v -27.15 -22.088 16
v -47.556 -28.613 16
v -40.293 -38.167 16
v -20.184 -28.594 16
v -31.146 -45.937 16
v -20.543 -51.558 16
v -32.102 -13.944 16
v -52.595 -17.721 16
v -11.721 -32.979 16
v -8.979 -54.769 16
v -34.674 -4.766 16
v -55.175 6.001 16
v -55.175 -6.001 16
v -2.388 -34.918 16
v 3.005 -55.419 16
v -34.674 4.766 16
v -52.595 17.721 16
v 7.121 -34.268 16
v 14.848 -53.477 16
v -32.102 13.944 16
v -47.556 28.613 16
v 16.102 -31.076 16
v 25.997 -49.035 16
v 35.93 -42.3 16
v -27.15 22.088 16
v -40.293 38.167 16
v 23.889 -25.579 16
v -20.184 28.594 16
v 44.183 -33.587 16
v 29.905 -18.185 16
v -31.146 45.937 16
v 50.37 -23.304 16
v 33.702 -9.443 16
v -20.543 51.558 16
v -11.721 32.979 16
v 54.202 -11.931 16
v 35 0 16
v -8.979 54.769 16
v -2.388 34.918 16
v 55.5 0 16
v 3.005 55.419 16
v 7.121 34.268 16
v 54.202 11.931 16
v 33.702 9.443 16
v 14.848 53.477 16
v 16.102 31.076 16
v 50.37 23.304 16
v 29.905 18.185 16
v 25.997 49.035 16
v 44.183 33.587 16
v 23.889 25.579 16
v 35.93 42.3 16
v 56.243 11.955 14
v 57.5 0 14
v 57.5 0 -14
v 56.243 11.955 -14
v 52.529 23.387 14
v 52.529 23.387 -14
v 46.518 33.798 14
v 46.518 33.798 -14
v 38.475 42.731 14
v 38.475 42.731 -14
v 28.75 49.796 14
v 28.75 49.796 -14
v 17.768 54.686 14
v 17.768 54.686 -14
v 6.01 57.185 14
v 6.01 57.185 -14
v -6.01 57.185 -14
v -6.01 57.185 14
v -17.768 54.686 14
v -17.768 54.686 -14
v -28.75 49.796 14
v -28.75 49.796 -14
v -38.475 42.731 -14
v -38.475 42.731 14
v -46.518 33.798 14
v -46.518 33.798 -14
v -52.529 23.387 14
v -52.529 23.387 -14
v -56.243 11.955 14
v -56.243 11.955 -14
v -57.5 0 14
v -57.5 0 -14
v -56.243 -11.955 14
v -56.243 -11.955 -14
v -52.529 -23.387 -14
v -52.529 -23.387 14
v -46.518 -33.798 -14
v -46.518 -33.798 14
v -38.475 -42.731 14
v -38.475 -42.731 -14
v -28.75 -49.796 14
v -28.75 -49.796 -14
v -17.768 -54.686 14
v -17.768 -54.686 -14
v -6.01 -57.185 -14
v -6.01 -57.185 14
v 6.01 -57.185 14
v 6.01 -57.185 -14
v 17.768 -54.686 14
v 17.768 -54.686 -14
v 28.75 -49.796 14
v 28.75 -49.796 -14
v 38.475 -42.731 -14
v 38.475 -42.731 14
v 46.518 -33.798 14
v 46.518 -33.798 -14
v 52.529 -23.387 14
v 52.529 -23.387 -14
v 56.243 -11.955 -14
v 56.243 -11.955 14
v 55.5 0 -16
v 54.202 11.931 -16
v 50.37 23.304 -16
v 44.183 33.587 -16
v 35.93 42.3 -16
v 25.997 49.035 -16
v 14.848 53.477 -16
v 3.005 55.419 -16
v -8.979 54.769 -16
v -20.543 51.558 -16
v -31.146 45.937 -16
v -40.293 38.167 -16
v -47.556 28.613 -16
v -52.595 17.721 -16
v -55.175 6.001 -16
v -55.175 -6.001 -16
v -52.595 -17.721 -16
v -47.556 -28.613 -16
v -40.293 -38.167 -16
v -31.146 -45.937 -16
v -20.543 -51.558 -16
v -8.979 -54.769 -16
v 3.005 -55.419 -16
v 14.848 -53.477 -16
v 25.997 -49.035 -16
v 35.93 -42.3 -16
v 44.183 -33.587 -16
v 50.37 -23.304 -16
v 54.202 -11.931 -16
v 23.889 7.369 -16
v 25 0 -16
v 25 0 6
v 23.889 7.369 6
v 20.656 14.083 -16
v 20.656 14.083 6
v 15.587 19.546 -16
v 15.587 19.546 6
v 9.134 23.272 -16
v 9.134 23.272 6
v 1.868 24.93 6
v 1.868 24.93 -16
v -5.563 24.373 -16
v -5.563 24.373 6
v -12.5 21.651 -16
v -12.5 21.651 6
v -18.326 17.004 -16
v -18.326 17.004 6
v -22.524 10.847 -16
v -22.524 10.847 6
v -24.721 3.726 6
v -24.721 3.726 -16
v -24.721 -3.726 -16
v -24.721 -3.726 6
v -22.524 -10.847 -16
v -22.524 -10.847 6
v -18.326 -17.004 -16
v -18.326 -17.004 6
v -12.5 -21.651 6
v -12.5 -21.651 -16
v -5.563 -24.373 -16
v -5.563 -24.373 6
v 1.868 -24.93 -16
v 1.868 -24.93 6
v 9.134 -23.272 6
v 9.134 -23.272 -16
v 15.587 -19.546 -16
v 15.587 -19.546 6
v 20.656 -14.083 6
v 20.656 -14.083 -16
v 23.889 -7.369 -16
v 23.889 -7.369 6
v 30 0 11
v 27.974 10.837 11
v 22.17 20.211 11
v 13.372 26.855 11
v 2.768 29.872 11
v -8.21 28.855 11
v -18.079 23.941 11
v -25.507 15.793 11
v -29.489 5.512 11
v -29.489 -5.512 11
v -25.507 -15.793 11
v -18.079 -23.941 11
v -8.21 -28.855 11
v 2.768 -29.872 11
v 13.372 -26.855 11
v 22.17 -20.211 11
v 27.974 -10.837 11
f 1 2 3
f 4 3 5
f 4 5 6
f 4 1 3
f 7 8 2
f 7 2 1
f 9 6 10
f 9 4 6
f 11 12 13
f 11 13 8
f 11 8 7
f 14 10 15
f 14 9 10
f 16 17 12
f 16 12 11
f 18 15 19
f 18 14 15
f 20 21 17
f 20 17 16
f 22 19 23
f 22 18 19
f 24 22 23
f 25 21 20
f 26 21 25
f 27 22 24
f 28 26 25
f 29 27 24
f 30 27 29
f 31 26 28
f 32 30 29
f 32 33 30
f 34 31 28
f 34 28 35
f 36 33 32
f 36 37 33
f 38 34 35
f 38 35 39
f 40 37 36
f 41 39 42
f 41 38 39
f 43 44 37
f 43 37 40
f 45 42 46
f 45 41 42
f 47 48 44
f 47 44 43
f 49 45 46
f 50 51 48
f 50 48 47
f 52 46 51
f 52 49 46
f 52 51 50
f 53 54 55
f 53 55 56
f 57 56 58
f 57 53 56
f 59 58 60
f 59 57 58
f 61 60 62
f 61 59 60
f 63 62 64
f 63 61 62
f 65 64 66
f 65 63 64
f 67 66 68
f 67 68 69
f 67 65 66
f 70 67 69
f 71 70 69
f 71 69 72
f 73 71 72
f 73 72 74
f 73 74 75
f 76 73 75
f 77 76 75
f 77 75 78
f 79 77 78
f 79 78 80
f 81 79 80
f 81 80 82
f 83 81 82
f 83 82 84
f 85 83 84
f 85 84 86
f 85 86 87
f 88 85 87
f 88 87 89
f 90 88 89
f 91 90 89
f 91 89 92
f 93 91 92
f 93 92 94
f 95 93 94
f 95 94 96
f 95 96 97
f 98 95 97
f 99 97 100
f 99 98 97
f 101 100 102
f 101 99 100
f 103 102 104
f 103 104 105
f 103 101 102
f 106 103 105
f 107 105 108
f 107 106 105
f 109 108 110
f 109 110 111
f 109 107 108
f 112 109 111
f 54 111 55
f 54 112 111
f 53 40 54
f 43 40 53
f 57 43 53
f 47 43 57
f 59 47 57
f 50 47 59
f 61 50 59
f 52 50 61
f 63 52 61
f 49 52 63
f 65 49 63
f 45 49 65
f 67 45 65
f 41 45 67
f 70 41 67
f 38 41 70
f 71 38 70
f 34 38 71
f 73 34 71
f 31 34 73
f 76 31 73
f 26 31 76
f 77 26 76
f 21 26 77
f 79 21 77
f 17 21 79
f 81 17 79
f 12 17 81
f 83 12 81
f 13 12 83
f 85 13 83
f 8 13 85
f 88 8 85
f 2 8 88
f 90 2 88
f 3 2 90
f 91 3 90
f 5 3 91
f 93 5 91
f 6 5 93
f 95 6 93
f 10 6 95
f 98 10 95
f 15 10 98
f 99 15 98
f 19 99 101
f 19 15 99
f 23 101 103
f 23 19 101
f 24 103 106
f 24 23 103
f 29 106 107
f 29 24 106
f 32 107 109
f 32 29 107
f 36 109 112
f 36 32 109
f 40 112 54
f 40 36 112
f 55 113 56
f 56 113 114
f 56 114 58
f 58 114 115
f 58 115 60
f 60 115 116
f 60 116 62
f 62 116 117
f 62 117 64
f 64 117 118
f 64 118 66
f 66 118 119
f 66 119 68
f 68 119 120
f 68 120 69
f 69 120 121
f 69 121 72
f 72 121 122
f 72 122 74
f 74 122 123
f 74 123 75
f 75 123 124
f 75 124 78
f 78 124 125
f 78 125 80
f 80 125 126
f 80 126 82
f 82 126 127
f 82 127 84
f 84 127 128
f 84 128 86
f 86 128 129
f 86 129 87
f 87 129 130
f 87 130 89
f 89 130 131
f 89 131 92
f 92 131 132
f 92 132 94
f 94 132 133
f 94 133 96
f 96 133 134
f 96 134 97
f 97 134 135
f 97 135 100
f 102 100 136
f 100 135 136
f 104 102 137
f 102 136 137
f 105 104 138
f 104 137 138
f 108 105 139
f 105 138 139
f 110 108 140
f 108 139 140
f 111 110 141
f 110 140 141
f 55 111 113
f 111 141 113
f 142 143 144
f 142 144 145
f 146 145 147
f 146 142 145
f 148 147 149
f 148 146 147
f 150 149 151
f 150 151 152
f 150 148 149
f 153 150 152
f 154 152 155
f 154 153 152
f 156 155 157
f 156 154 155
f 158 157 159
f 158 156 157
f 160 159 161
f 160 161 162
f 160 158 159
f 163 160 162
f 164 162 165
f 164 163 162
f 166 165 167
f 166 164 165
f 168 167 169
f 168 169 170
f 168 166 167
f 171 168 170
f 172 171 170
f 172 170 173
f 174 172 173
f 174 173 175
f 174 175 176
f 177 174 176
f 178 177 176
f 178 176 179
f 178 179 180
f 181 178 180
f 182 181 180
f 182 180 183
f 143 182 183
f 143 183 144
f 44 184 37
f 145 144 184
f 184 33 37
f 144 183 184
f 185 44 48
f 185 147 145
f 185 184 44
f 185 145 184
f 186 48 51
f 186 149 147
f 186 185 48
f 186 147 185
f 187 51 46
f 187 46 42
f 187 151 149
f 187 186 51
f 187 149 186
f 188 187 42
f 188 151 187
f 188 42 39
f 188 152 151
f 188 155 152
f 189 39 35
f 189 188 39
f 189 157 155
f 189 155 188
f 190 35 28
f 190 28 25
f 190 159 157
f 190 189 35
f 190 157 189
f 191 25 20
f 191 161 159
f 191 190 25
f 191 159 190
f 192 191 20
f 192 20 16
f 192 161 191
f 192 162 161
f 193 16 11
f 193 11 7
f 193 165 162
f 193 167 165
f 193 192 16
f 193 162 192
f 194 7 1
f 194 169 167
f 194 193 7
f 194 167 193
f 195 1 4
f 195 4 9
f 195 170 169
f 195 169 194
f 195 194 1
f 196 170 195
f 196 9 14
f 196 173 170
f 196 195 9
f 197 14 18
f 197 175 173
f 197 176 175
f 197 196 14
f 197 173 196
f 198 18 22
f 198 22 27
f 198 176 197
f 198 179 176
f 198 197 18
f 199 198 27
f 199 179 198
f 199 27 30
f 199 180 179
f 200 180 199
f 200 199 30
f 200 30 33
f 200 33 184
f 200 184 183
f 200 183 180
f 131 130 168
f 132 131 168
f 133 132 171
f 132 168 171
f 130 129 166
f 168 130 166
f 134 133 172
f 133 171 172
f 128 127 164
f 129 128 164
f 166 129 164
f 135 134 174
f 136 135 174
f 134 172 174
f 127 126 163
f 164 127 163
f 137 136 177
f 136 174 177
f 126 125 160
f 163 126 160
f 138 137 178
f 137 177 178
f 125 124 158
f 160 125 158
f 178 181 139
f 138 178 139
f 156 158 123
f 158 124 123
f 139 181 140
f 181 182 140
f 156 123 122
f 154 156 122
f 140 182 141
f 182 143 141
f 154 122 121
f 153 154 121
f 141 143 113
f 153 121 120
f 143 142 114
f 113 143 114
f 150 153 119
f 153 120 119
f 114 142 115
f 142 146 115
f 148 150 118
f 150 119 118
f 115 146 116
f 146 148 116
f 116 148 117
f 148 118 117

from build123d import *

# Parameters (mm, degrees)
SKETCH1_R           = 57.5
SKETCH1_R_2         = 25
BOSS_EXTRUDE1_DEPTH = 16
CHAMFER1_SIZE       = 2
CHAMFER2_SIZE       = 10


with BuildPart() as part:
    # Sketch1 → Boss-Extrude1 (new, symmetric)
    with BuildSketch(Plane.XY):
        Circle(SKETCH1_R)
        Circle(SKETCH1_R_2, mode=Mode.SUBTRACT)
    extrude(amount=BOSS_EXTRUDE1_DEPTH, both=True)

    # Chamfer1
    chamfer1_edges = [part.edges().sort_by_distance(p)[0] for p in [
        (-57.5, 0, -16),
        (-57.5, 0, 16),
    ]]
    chamfer(chamfer1_edges, length=CHAMFER1_SIZE)

    # Chamfer2
    chamfer2_edges = [part.edges().sort_by_distance(p)[0] for p in [
        (-25, 0, 16),
    ]]
    chamfer(chamfer2_edges, length=CHAMFER2_SIZE)


solid = part.part
